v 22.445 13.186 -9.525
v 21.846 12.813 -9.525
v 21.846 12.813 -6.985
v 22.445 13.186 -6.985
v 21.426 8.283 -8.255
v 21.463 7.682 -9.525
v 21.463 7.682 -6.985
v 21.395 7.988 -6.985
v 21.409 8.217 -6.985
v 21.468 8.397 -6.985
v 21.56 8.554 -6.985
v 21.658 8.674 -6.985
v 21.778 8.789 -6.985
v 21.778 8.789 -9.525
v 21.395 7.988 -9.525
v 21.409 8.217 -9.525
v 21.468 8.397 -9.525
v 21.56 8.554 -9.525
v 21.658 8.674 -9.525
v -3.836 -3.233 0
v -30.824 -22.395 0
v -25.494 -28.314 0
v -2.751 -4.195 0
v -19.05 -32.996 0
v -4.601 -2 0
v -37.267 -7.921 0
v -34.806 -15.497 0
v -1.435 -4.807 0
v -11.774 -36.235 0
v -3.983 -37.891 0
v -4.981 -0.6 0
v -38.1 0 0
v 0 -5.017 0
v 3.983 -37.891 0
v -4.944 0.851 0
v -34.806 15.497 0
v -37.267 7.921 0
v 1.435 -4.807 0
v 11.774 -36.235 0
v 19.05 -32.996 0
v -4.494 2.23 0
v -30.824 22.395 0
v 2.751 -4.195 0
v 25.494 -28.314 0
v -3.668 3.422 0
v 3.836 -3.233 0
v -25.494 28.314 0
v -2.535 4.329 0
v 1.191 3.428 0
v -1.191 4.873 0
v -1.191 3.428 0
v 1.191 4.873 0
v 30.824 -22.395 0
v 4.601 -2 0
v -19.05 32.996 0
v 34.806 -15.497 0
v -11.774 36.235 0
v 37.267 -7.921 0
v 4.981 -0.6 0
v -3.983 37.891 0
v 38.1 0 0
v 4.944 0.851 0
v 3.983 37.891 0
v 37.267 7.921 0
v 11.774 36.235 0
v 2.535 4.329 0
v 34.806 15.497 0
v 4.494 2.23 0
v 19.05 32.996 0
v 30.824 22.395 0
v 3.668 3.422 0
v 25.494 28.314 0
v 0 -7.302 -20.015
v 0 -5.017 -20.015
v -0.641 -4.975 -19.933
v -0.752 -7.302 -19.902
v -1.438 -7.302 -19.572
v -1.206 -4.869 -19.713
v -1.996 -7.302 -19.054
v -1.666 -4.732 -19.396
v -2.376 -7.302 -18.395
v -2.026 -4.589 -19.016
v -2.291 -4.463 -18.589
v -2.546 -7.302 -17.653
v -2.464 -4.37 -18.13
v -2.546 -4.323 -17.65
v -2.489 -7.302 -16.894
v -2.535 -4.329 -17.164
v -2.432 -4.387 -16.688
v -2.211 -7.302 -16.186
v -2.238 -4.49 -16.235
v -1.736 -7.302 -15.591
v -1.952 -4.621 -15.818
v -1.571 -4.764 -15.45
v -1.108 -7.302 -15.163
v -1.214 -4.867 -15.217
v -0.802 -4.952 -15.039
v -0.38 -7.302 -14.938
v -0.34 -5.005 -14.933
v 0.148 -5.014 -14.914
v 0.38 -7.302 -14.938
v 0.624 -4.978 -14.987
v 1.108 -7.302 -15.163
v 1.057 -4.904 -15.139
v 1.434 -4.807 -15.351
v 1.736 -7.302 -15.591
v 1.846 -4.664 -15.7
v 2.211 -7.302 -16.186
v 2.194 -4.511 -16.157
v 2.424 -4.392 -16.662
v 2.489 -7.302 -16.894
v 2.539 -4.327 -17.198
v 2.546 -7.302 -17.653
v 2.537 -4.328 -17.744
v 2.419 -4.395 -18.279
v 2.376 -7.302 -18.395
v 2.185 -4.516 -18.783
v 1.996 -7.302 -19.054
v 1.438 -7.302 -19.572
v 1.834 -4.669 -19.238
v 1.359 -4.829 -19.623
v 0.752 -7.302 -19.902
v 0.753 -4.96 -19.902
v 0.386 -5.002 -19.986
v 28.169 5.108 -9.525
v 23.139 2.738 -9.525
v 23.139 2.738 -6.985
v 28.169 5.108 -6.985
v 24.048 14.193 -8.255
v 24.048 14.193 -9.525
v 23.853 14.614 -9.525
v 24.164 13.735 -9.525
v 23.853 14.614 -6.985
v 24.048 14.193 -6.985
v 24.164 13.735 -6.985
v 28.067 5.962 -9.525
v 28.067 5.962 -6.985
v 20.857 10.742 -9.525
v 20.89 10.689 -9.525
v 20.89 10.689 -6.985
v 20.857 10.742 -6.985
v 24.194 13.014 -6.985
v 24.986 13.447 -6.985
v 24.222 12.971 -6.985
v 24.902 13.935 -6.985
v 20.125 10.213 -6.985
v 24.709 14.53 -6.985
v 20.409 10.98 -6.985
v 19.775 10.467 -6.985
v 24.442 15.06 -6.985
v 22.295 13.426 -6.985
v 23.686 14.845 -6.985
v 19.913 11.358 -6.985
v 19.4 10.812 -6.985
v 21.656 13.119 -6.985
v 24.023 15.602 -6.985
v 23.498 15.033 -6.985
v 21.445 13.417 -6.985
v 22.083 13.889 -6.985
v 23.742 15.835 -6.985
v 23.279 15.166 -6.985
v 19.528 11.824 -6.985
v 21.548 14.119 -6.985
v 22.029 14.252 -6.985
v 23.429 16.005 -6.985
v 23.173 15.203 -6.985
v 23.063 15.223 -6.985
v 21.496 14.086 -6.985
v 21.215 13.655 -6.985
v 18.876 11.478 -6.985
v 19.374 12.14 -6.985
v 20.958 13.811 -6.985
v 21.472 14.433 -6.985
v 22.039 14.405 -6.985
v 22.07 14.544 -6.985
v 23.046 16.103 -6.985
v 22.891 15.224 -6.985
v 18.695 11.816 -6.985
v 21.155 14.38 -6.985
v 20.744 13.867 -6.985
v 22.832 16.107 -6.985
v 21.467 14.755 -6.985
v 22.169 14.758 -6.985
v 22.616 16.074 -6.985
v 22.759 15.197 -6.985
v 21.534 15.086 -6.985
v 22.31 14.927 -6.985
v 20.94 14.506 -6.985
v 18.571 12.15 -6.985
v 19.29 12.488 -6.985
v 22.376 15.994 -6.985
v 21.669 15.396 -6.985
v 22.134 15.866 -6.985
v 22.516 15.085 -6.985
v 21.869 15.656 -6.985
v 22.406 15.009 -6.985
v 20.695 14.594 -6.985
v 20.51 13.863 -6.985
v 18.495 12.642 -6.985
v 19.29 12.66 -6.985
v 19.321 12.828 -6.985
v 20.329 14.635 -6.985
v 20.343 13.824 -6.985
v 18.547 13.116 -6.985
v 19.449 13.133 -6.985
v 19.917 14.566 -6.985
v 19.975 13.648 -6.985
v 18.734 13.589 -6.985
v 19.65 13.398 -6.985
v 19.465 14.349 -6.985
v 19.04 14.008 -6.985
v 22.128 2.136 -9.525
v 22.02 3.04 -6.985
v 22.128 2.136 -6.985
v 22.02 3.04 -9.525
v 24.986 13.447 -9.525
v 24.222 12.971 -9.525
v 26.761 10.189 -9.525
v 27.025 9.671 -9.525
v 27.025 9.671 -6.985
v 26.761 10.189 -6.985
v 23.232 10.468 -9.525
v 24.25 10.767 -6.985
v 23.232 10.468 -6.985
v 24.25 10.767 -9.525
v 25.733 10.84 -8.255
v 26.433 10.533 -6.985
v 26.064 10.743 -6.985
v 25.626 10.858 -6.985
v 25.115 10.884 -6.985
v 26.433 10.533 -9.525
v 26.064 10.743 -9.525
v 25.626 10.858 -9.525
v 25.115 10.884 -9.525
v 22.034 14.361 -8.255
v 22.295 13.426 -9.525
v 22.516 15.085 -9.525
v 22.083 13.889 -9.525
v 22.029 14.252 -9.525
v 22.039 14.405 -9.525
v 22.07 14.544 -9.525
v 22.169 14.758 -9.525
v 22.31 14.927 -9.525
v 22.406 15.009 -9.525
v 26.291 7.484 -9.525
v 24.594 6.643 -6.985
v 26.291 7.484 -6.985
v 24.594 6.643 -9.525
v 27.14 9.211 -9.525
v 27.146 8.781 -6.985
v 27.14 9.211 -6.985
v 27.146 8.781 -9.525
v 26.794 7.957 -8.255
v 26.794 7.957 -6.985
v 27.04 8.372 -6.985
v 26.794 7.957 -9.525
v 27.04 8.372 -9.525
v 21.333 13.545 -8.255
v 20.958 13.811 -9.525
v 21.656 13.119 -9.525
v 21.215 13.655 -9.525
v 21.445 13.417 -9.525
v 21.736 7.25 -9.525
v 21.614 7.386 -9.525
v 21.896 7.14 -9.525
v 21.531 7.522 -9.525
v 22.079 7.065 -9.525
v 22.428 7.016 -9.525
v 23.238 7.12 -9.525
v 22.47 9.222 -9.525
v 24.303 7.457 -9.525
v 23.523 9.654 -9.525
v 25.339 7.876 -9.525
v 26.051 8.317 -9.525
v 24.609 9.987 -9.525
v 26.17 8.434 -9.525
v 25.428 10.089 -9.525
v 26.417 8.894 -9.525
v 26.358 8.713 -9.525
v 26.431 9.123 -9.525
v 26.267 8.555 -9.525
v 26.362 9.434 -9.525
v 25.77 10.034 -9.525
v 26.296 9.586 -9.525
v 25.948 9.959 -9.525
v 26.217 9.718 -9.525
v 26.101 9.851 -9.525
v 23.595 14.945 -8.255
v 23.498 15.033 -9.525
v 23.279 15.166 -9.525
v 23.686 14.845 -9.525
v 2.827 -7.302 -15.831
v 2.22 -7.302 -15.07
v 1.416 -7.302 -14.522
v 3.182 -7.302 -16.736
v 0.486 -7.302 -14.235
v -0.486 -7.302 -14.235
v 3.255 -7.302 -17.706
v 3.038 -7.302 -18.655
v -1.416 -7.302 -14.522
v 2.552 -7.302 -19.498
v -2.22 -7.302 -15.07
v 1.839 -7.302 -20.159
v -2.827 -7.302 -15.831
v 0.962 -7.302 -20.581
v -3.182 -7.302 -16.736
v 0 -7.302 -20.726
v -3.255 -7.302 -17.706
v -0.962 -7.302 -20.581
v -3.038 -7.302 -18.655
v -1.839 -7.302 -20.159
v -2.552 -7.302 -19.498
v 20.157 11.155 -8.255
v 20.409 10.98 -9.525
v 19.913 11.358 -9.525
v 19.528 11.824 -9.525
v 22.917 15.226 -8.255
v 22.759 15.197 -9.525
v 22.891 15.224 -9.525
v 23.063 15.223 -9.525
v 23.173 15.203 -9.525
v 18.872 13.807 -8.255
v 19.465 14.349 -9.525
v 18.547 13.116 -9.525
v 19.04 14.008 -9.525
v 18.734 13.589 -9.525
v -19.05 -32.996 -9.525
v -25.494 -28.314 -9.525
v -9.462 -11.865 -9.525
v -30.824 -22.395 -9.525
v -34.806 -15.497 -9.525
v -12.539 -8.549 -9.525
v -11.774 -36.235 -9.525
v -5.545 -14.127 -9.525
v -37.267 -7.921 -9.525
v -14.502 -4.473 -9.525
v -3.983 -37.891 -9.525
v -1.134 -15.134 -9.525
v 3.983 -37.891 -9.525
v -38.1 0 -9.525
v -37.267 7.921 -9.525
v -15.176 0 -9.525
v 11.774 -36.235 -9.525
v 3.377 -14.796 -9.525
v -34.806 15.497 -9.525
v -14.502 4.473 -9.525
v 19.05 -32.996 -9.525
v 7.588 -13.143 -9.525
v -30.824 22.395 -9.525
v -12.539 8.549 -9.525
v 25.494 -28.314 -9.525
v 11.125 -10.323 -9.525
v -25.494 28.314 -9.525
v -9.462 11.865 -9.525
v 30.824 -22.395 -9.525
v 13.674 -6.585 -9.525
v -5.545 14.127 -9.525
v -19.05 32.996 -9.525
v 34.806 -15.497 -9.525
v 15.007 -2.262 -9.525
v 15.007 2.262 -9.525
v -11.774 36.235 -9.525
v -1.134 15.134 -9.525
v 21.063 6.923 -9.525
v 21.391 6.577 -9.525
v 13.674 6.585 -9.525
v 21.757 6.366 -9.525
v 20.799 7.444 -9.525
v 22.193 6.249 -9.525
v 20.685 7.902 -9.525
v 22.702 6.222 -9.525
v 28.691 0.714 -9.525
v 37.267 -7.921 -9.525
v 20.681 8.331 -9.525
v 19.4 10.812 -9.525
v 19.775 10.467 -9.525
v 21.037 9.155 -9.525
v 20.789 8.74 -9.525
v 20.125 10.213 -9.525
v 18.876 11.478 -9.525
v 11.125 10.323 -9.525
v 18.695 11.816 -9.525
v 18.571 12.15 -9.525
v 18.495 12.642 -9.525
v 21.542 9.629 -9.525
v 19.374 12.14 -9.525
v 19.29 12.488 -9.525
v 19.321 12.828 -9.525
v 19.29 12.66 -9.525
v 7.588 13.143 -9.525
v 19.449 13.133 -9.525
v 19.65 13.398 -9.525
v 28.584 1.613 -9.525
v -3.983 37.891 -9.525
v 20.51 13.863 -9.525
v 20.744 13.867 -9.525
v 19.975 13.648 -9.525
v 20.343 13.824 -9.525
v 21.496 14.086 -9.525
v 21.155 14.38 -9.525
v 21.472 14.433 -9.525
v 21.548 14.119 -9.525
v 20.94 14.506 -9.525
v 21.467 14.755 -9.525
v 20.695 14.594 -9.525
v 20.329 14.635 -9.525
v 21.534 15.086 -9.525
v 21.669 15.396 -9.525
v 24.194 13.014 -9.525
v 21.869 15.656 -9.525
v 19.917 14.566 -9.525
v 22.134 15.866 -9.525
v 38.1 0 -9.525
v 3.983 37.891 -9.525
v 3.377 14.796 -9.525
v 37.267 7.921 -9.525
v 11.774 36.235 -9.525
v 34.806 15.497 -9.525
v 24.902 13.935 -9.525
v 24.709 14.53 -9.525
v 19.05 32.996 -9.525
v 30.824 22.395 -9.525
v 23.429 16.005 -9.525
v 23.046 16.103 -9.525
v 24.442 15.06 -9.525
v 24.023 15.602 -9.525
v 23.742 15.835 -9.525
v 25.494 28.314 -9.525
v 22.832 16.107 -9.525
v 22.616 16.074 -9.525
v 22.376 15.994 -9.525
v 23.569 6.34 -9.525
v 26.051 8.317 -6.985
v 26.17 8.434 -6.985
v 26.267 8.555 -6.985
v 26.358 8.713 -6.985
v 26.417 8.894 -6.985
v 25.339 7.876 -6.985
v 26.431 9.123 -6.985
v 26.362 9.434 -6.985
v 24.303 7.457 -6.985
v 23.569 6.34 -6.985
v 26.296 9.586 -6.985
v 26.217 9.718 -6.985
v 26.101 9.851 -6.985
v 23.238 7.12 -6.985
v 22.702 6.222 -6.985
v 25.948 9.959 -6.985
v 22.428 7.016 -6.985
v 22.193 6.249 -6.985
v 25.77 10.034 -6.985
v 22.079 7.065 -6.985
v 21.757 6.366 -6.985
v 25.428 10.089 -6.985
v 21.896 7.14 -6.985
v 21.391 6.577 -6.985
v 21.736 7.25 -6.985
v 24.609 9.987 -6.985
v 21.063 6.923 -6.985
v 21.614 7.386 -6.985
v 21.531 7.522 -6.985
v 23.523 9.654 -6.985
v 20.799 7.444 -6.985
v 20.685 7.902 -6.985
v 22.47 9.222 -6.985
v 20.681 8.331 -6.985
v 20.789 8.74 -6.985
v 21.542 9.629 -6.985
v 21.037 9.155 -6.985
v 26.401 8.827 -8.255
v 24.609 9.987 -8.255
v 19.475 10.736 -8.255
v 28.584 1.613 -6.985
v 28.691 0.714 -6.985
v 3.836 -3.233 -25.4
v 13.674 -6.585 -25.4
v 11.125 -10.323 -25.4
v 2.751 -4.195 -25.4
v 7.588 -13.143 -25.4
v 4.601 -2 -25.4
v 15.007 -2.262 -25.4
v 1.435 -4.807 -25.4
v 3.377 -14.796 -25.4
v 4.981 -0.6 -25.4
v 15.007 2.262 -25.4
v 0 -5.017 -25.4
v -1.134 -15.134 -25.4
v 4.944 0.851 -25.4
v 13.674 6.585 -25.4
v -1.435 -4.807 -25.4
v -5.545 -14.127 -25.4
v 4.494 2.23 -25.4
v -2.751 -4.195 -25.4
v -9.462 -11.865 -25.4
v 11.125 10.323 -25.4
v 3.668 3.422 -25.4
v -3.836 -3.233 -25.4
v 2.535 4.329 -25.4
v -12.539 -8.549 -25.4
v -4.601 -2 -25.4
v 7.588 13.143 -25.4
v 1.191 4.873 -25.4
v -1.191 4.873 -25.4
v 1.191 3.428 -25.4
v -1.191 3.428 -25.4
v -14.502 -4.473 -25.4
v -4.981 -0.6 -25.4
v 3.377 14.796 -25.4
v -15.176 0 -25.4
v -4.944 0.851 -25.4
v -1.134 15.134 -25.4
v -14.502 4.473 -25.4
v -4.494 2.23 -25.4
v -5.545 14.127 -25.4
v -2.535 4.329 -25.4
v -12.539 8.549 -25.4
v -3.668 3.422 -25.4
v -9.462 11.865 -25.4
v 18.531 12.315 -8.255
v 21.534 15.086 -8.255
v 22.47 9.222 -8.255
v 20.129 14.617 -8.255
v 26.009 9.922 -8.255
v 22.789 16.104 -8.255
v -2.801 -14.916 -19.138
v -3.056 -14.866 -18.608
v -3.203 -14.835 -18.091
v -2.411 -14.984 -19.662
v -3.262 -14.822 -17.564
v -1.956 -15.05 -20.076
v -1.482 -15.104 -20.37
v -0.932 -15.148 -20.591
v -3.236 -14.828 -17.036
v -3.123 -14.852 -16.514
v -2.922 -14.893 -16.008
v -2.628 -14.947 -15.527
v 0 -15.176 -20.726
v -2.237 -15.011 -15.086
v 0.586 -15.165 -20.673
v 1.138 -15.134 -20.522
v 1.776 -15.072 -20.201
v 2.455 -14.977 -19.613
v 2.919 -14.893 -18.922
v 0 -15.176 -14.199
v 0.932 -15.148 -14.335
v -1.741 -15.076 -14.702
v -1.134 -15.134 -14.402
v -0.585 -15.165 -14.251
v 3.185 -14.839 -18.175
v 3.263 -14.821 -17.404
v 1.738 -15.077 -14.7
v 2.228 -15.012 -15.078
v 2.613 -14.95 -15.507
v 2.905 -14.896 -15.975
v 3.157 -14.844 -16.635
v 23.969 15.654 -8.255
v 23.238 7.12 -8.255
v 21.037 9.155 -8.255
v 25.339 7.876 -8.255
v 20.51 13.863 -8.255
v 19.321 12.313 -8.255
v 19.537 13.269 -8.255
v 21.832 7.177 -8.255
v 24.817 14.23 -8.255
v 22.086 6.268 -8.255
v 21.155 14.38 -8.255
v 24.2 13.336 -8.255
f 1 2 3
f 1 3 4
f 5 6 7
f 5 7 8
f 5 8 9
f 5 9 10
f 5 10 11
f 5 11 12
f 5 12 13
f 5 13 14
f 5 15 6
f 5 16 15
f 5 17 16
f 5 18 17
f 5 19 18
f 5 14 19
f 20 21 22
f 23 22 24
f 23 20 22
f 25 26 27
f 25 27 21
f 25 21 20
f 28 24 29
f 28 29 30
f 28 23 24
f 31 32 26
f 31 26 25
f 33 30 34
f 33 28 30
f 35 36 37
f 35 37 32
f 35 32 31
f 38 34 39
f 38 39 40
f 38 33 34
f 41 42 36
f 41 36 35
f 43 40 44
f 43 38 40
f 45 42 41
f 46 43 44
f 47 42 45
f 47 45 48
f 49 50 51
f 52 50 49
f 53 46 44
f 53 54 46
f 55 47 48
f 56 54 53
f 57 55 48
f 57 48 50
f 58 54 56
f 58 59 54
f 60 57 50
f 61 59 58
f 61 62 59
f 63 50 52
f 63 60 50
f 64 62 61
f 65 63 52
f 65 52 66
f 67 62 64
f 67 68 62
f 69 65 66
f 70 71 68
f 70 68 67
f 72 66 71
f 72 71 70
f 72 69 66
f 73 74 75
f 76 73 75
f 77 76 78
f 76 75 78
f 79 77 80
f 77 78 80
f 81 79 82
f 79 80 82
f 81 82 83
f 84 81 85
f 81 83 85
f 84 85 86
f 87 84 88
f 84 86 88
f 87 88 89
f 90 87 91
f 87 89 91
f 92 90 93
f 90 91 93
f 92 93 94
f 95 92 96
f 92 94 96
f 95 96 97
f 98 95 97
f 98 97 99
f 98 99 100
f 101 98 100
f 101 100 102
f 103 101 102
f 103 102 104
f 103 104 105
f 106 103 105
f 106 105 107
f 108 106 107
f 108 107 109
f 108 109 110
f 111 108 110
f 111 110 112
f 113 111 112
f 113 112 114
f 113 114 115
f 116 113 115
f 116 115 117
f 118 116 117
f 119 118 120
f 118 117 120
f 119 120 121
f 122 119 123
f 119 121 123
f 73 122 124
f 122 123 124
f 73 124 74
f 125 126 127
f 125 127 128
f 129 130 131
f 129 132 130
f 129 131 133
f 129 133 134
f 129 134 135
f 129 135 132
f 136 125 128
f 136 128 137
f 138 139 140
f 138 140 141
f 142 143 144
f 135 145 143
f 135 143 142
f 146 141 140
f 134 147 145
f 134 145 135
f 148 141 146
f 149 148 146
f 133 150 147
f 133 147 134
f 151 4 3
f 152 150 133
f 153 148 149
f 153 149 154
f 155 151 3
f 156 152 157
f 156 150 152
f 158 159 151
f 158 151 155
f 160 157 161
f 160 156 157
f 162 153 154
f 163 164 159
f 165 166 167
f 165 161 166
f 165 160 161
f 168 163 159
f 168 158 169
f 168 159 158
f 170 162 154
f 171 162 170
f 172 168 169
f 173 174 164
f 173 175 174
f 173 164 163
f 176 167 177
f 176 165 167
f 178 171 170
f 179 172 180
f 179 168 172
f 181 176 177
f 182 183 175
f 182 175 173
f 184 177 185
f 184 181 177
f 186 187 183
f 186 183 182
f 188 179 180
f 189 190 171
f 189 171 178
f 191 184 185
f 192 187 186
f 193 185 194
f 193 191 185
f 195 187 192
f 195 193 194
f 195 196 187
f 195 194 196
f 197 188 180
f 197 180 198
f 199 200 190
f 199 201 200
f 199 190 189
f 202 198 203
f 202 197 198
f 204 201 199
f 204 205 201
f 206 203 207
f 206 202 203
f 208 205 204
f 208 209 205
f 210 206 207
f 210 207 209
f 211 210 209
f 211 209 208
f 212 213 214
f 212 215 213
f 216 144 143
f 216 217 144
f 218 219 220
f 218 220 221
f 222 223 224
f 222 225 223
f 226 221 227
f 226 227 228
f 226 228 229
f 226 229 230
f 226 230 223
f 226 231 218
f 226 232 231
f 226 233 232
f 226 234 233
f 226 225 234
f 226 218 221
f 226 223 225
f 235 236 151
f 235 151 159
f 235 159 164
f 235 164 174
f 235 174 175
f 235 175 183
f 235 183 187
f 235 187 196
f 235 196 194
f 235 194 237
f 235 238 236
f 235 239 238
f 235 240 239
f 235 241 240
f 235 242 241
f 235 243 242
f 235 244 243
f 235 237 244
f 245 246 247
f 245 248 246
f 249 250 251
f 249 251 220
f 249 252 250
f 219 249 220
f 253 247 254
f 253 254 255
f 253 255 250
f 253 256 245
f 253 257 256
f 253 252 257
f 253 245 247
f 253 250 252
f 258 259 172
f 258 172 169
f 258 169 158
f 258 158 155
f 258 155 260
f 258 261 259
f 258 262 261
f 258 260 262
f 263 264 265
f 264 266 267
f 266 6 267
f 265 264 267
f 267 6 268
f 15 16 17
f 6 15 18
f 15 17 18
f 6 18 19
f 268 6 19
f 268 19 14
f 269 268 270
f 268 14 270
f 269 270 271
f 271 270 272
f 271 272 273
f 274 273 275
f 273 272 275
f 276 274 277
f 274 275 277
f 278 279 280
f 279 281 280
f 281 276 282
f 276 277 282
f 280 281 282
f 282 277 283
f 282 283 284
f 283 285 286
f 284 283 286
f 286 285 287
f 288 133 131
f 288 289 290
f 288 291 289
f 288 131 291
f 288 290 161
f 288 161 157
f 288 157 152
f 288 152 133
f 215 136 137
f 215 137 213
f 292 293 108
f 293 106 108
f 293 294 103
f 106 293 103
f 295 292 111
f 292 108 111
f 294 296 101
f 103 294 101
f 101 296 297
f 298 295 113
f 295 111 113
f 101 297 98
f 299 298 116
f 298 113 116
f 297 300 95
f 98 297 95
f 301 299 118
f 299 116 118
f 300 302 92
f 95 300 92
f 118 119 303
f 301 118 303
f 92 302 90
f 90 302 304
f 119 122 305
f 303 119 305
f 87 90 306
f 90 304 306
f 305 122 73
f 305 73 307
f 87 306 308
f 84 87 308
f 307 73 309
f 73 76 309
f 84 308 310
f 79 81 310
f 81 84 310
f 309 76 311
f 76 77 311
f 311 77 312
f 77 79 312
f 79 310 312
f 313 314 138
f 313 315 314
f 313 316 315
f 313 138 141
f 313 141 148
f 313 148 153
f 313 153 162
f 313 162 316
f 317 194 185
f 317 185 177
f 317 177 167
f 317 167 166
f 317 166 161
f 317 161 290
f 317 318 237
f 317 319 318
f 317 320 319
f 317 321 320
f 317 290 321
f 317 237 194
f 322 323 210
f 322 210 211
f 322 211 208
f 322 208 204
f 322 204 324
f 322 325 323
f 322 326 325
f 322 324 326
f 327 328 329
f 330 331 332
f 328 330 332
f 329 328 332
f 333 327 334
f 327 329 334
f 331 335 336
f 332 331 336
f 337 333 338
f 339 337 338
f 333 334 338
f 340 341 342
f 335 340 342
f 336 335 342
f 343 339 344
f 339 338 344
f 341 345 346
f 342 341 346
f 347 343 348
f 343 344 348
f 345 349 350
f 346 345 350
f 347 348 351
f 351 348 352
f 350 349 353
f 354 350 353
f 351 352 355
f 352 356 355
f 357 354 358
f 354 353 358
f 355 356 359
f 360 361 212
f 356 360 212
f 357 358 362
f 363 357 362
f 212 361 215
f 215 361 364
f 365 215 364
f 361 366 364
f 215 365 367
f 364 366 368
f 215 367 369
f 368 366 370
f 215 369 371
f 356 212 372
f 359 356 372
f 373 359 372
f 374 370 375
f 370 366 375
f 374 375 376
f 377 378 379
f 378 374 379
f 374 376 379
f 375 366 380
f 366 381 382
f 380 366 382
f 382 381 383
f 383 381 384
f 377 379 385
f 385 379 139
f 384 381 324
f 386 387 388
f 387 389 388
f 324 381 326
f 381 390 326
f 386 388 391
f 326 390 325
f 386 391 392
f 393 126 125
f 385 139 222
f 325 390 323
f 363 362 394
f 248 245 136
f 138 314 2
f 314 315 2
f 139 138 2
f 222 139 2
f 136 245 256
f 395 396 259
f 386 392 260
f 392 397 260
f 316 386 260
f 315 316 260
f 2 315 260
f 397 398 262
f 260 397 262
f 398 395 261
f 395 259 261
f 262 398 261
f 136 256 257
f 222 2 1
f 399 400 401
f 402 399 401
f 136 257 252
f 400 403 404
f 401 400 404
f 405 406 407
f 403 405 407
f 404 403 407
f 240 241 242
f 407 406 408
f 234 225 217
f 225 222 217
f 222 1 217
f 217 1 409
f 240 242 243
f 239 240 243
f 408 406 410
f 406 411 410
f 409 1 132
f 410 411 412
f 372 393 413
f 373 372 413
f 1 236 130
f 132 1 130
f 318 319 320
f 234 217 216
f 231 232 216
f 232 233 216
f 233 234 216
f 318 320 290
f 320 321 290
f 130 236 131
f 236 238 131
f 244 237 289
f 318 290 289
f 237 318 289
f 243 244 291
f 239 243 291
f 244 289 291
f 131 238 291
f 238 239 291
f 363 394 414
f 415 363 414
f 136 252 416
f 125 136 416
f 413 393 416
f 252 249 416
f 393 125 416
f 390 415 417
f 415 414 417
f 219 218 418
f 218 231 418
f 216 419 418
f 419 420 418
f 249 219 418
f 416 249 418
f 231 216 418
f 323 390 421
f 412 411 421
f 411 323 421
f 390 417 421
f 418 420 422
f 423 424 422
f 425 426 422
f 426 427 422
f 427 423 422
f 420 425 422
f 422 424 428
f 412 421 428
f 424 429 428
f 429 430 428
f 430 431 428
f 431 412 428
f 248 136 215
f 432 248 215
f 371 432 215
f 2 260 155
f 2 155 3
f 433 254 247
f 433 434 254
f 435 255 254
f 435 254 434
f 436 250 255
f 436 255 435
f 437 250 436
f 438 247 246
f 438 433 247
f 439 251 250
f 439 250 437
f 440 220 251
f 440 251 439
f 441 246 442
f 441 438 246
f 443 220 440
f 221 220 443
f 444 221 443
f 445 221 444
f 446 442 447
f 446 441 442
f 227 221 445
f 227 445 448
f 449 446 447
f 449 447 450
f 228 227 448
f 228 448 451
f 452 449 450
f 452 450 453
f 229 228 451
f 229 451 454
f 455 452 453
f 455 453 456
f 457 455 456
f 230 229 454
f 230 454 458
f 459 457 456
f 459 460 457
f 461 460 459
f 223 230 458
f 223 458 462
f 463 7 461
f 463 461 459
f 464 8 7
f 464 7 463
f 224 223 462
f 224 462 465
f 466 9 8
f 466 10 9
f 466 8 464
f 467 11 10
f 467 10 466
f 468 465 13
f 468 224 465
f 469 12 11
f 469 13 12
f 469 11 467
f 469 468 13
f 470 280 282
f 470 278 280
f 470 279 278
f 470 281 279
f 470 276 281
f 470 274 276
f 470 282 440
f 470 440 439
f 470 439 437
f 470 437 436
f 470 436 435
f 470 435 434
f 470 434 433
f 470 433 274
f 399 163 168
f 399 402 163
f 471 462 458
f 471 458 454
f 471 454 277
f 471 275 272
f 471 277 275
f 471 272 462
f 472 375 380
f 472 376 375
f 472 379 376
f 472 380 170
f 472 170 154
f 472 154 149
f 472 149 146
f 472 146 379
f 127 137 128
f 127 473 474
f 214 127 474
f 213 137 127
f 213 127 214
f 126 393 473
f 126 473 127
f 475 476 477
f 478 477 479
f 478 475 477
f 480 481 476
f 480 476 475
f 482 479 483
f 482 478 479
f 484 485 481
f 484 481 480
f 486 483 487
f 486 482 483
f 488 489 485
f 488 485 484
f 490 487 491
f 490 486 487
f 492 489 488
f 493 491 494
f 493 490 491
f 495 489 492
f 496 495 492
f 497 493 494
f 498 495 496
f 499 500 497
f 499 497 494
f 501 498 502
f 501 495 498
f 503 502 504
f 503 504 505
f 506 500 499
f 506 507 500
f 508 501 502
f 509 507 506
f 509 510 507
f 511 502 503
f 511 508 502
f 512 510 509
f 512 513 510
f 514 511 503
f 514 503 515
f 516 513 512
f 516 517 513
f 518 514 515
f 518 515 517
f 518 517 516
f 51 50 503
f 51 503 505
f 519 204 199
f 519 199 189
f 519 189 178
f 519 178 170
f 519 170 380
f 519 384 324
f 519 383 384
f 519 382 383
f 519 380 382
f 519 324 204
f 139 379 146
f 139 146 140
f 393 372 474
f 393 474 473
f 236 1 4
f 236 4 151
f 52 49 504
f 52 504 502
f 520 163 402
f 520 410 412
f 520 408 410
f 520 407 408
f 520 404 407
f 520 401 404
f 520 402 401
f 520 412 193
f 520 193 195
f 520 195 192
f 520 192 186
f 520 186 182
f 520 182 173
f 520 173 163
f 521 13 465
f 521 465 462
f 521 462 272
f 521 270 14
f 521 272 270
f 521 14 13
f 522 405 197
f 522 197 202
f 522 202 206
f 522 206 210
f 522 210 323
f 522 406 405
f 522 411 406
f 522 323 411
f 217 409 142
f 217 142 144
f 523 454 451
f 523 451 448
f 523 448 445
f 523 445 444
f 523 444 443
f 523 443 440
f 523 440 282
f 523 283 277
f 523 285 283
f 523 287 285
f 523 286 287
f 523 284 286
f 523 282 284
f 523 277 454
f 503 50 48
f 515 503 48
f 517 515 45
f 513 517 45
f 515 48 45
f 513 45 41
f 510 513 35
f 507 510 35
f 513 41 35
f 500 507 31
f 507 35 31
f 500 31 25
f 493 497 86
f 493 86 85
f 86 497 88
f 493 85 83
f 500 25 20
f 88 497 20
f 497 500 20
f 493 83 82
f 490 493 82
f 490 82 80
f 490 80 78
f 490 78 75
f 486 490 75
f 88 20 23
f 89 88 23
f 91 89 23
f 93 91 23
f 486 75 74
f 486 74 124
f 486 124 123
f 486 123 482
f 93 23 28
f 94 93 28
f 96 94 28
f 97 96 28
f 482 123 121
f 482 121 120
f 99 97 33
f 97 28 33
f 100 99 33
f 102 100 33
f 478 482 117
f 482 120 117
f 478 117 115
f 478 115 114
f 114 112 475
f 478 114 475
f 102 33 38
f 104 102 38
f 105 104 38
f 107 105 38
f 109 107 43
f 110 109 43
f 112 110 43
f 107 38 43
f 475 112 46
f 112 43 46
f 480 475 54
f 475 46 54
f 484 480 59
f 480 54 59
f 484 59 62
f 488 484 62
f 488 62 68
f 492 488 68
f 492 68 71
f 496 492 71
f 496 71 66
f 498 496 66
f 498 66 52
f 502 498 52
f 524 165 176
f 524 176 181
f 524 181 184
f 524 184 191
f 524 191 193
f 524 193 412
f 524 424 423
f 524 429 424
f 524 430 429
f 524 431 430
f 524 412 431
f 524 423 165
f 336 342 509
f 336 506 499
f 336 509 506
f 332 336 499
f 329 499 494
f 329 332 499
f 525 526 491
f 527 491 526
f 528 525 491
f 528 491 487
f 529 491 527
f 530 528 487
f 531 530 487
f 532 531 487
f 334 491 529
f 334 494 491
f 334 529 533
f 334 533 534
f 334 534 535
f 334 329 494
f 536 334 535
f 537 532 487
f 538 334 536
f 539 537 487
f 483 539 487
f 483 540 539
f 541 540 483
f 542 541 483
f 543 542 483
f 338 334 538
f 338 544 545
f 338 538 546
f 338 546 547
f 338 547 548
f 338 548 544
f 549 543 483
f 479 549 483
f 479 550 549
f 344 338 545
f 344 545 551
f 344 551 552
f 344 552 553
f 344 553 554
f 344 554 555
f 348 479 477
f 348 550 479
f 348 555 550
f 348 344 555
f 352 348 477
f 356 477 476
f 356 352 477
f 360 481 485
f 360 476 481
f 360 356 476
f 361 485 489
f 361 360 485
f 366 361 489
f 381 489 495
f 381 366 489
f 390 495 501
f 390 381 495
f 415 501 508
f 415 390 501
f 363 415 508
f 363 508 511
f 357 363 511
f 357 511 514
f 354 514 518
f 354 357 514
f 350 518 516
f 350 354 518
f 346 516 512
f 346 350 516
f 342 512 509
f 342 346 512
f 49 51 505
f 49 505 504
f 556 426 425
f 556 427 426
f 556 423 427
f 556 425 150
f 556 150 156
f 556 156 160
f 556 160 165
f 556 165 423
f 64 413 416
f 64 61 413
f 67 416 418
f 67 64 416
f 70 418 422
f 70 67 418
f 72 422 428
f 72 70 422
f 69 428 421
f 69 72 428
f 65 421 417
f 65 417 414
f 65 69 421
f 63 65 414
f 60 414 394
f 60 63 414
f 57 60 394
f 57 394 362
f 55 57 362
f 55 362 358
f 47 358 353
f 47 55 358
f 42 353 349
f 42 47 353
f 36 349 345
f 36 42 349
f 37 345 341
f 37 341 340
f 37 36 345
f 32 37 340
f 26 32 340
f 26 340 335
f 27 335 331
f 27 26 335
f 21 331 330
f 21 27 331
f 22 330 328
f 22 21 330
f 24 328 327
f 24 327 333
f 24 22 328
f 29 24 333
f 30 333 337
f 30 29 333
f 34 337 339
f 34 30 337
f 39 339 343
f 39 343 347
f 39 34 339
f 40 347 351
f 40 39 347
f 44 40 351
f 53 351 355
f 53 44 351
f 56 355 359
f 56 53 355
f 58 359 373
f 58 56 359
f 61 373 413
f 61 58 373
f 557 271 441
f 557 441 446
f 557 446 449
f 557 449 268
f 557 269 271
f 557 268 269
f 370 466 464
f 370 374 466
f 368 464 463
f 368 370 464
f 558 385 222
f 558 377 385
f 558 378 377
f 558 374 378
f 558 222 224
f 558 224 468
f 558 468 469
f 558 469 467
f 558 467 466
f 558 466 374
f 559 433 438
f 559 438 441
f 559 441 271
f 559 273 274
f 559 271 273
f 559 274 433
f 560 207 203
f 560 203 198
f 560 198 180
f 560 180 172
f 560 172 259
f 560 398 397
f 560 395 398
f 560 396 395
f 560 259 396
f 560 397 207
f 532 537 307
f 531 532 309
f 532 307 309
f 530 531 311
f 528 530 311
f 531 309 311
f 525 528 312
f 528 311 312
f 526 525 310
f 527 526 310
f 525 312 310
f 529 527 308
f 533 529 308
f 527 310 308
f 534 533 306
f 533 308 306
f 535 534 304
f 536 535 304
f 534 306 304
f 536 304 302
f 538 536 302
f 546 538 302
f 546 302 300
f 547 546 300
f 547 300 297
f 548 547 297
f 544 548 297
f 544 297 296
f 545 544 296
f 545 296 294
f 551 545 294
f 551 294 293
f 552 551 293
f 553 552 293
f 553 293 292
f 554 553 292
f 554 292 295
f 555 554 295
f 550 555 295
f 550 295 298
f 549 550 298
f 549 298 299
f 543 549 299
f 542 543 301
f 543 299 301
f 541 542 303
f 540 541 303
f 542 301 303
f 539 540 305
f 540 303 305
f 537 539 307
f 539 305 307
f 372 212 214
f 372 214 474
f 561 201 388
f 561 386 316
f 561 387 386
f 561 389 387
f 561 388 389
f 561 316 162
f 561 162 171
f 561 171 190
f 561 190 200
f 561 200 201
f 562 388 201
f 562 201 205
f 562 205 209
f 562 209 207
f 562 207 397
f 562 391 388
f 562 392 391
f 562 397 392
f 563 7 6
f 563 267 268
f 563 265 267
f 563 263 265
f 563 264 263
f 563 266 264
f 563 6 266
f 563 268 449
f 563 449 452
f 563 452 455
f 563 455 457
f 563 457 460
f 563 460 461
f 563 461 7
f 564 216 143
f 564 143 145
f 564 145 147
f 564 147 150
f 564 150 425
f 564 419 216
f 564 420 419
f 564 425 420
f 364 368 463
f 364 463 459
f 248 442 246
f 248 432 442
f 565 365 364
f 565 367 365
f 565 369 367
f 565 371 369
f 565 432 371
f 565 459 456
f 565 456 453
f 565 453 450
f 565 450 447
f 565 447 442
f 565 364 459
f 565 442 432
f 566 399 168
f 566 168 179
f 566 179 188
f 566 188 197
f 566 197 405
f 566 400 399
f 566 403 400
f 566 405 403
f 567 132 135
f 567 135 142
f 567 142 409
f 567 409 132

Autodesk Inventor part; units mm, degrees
ref_plane "YZ Plane" through (0, 0, 0) normal (1, 0, 0) x (0, 1, 0)
ref_plane "XY Plane" through (0, 0, 0) normal (0, 0, 1) x (1, 0, 0)
sketch "Sketch1" plane through (0, 0, 0) normal (0, 0, 1) x (1, 0, 0)
  circle A0 centre (0, 0) radius 38.1
  dimension "d0" = 76.2
extrude "Extrusion1" add sketch "Sketch1" against normal blind 9.525
sketch "Sketch2" plane through (0, 0, -9.525) normal (0, 0, -1) x (-1, 0, 0)
  circle A0 centre (0, 0) radius 15.1765
  dimension "d3" = 30.353
extrude "Extrusion2" add sketch "Sketch2" along normal blind 15.875
sketch "Sketch3" plane through (0, 0, 0) normal (0, 0, 1) x (1, 0, 0)
  arc A0 (-1.1906, 4.8732) -> (1.1906, 4.8732) centre (0, 0) ccw
  line L0 (-1.1906, 4.8732) -> (-1.1906, 3.4285)
  line L1 (-1.1906, 3.4285) -> (1.1906, 3.4285)
  line L2 (1.1906, 3.4285) -> (1.1906, 4.8732)
  circle A1 centre (0, 0) radius 15.1765 projected
  dimension "d6" = 10.033
  dimension "d7" = 2.3813
  dimension "d8" = 1.4446
  dimension "d15" = 10.16
extrude "Extrusion3" cut sketch "Sketch3" against normal through all contours L0 L1 L2 A0
ref_plane "Work Plane2" through (0, -15.1765, 0) normal (0, 1, 0) x (-1, 0, 0)
sketch "Sketch4" plane through (0, -15.1765, 0) normal (0, 1, 0) x (-1, 0, 0)
  line L0 (-15.1765, -9.525) -> (-15.1765, -25.4) projected
  line L1 (15.1765, -9.525) -> (15.1765, -25.4) projected
  line L2 (-38.1, -9.525) -> (38.1, -9.525) projected
  line L3 (-15.1765, -25.4) -> (15.1765, -25.4) projected
  line L4 (0, -25.4) -> (0, -9.525) construction
  point P0 (0, 0)
  point P1 (0, -17.4625)
hole "Hole1" at (0, -15.1765, -17.4625) direction (0, 1, 0) diameter 5.1054 depth 11.43 counterbore diameter 6.5278 counterbore depth 7.874 clearance for "Hex Machine Screw" size "#10" standard "Ansi Unified Screw Threads"
sketch "Sketch5" plane through (0, 0, -9.525) normal (0, 0, -1) x (-1, 0, 0)
  circle A0 centre (0, 0) radius 25.4 construction
  line L0 (-28.0674, 5.9618) -> (-22.0201, 3.0404)
  line L1 (-22.0201, 3.0404) -> (-22.1276, 2.1359)
  line L2 (-22.1276, 2.1359) -> (-28.6914, 0.7139)
  line L3 (-28.6914, 0.7139) -> (-28.5844, 1.6133)
  line L4 (-28.5844, 1.6133) -> (-23.139, 2.7381)
  line L5 (-23.139, 2.7381) -> (-28.1689, 5.1084)
  line L6 (-28.1689, 5.1084) -> (-28.0674, 5.9618)
  spline S0 degree 2 poles (-23.232, 10.4675) (-21.6233, 9.8922) (-20.4509, 8.4181) (-20.7992, 7.4442) knots 0 0 0 1 2 2 2
  spline S1 degree 2 poles (-20.7992, 7.4442) (-21.1527, 6.4557) (-23.0196, 6.0796) (-24.5944, 6.6428) knots 0 0 0 1 2 2 2
  spline S2 degree 2 poles (-24.5944, 6.6428) (-26.2127, 7.2216) (-27.3754, 8.6922) (-27.0254, 9.6709) knots 0 0 0 1 2 2 2
  spline S3 degree 2 poles (-27.0254, 9.6709) (-26.6736, 10.6545) (-24.7921, 11.0255) (-23.232, 10.4675) knots 0 0 0 1 2 2 2
  spline S4 degree 2 poles (-21.7775, 8.7887) (-22.0315, 9.0107) (-22.9077, 9.4334) (-23.5231, 9.6535) knots 0 0 0 1 2 2 2
  spline S5 degree 2 poles (-23.5231, 9.6535) (-24.1384, 9.8735) (-25.0792, 10.1007) (-25.4277, 10.0887) knots 0 0 0 1 2 2 2
  spline S6 degree 2 poles (-25.4277, 10.0887) (-25.7763, 10.0768) (-26.242, 9.7679) (-26.3616, 9.4335) knots 0 0 0 1 2 2 2
  spline S7 degree 2 poles (-26.3616, 9.4335) (-26.4812, 9.0992) (-26.3204, 8.5553) (-26.0506, 8.3167) knots 0 0 0 1 2 2 2
  spline S8 degree 2 poles (-26.0506, 8.3167) (-25.7886, 8.0864) (-24.8895, 7.6665) (-24.3032, 7.4568) knots 0 0 0 1 2 2 2
  spline S9 degree 2 poles (-24.3032, 7.4568) (-23.6733, 7.2315) (-22.8025, 7.0075) (-22.428, 7.0157) knots 0 0 0 1 2 2 2
  spline S10 degree 2 poles (-22.428, 7.0157) (-22.0763, 7.0211) (-21.5878, 7.3327) (-21.463, 7.6816) knots 0 0 0 1 2 2 2
  spline S11 degree 2 poles (-21.463, 7.6816) (-21.3451, 8.0111) (-21.5059, 8.5549) (-21.7775, 8.7887) knots 0 0 0 1 2 2 2
  spline S12 degree 2 poles (-23.8527, 14.6142) (-23.9751, 14.4177) (-24.1212, 13.9691) (-24.1639, 13.735) knots 0 0 0 1 2 2 2
  spline S13 degree 2 poles (-24.1639, 13.735) (-24.1985, 13.5141) (-24.2017, 13.1584) (-24.1944, 13.0144) knots 0 0 0 1 2 2 2
  line L7 (-24.1944, 13.0144) -> (-24.2216, 12.9707)
  line L8 (-24.2216, 12.9707) -> (-24.986, 13.4468)
  spline S14 degree 2 poles (-24.986, 13.4468) (-24.9658, 13.7616) (-24.6677, 14.6975) (-24.4419, 15.0601) knots 0 0 0 1 2 2 2
  spline S15 degree 2 poles (-24.4419, 15.0601) (-24.2134, 15.427) (-23.7248, 15.8805) (-23.4288, 16.0053) knots 0 0 0 1 2 2 2
  spline S16 degree 2 poles (-23.4288, 16.0053) (-23.1116, 16.135) (-22.4657, 16.0722) (-22.1337, 15.8655) knots 0 0 0 1 2 2 2
  spline S17 degree 2 poles (-22.1337, 15.8655) (-21.6882, 15.588) (-21.3801, 14.5837) (-21.5485, 14.1187) knots 0 0 0 1 2 2 2
  line L9 (-21.5485, 14.1187) -> (-21.496, 14.0861)
  spline S18 degree 2 poles (-21.496, 14.0861) (-21.355, 14.2346) (-20.9556, 14.5254) (-20.695, 14.5935) knots 0 0 0 1 2 2 2
  spline S19 degree 2 poles (-20.695, 14.5935) (-20.4387, 14.6642) (-19.8189, 14.5692) (-19.4651, 14.3488) knots 0 0 0 1 2 2 2
  spline S20 degree 2 poles (-19.4651, 14.3488) (-19.1026, 14.123) (-18.6418, 13.4905) (-18.5474, 13.1164) knots 0 0 0 1 2 2 2
  spline S21 degree 2 poles (-18.5474, 13.1164) (-18.4497, 12.7282) (-18.6126, 11.9021) (-18.8765, 11.4784) knots 0 0 0 1 2 2 2
  spline S22 degree 2 poles (-18.8765, 11.4784) (-19.1295, 11.0722) (-19.8212, 10.3997) (-20.1253, 10.2132) knots 0 0 0 1 2 2 2
  line L10 (-20.1253, 10.2132) -> (-20.8897, 10.6893)
  line L11 (-20.8897, 10.6893) -> (-20.857, 10.7417)
  spline S23 degree 2 poles (-20.857, 10.7417) (-20.5496, 10.8655) (-19.765, 11.4438) (-19.5283, 11.8238) knots 0 0 0 1 2 2 2
  spline S24 degree 2 poles (-19.5283, 11.8238) (-19.3896, 12.0466) (-19.2519, 12.5791) (-19.321, 12.8283) knots 0 0 0 1 2 2 2
  spline S25 degree 2 poles (-19.321, 12.8283) (-19.3928, 13.0731) (-19.682, 13.4654) (-19.9746, 13.6477) knots 0 0 0 1 2 2 2
  spline S26 degree 2 poles (-19.9746, 13.6477) (-20.2673, 13.83) (-20.7534, 13.8963) (-20.9578, 13.8114) knots 0 0 0 1 2 2 2
  spline S27 degree 2 poles (-20.9578, 13.8114) (-21.1622, 13.7266) (-21.5036, 13.3633) (-21.656, 13.1187) knots 0 0 0 1 2 2 2
  line L12 (-21.656, 13.1187) -> (-21.8464, 12.813)
  line L13 (-21.8464, 12.813) -> (-22.4448, 13.1857)
  line L14 (-22.4448, 13.1857) -> (-22.2952, 13.4259)
  spline S28 degree 2 poles (-22.2952, 13.4259) (-21.9932, 13.9107) (-22.0753, 14.8106) (-22.5165, 15.0854) knots 0 0 0 1 2 2 2
  spline S29 degree 2 poles (-22.5165, 15.0854) (-22.7218, 15.2133) (-23.1124, 15.2383) (-23.2786, 15.166) knots 0 0 0 1 2 2 2
  spline S30 degree 2 poles (-23.2786, 15.166) (-23.4547, 15.0878) (-23.7357, 14.8021) (-23.8527, 14.6142) knots 0 0 0 1 2 2 2
  dimension "d24" = 50.8
extrude "Extrusion4" cut sketch "Sketch5" against normal blind 2.54
equation "\"d0\" = outerDiameter"
equation "\"d1\" = handleThickness"
equation "\"d3\" = shaftOutsideDiameter"
equation "\"d4\" = shaftLength"
equation "\"d6\" = shaftDiameter"
equation "\"d7\" = keyWidth"
equation "\"d8\" = keyDepth"
equation "\"outerDiameter\" = 76.2"
equation "\"handleThickness\" = 9.525"
equation "\"totalLength\" = 25.4"
equation "\"shaftDiameter\" = 10.033"
equation "\"keyWidth\" = 2.38125"
equation "\"keyDepth\" = 1.44462"
equation "\"shaftLength\" = totalLength - handleThickness"
equation "\"shaftOutsideDiameter\" = shaftDiameter + 2 * setScrewDepth"
equation "\"setScrewDepth\" = 10.16"
equation "\"setScrewWorkPlane\" = 0.5 * shaftOutsideDiameter"
equation "\"d16\" = -setScrewWorkPlane"
properties part number "celestronMountDecHandle" material "PC/ABS Plastic"
